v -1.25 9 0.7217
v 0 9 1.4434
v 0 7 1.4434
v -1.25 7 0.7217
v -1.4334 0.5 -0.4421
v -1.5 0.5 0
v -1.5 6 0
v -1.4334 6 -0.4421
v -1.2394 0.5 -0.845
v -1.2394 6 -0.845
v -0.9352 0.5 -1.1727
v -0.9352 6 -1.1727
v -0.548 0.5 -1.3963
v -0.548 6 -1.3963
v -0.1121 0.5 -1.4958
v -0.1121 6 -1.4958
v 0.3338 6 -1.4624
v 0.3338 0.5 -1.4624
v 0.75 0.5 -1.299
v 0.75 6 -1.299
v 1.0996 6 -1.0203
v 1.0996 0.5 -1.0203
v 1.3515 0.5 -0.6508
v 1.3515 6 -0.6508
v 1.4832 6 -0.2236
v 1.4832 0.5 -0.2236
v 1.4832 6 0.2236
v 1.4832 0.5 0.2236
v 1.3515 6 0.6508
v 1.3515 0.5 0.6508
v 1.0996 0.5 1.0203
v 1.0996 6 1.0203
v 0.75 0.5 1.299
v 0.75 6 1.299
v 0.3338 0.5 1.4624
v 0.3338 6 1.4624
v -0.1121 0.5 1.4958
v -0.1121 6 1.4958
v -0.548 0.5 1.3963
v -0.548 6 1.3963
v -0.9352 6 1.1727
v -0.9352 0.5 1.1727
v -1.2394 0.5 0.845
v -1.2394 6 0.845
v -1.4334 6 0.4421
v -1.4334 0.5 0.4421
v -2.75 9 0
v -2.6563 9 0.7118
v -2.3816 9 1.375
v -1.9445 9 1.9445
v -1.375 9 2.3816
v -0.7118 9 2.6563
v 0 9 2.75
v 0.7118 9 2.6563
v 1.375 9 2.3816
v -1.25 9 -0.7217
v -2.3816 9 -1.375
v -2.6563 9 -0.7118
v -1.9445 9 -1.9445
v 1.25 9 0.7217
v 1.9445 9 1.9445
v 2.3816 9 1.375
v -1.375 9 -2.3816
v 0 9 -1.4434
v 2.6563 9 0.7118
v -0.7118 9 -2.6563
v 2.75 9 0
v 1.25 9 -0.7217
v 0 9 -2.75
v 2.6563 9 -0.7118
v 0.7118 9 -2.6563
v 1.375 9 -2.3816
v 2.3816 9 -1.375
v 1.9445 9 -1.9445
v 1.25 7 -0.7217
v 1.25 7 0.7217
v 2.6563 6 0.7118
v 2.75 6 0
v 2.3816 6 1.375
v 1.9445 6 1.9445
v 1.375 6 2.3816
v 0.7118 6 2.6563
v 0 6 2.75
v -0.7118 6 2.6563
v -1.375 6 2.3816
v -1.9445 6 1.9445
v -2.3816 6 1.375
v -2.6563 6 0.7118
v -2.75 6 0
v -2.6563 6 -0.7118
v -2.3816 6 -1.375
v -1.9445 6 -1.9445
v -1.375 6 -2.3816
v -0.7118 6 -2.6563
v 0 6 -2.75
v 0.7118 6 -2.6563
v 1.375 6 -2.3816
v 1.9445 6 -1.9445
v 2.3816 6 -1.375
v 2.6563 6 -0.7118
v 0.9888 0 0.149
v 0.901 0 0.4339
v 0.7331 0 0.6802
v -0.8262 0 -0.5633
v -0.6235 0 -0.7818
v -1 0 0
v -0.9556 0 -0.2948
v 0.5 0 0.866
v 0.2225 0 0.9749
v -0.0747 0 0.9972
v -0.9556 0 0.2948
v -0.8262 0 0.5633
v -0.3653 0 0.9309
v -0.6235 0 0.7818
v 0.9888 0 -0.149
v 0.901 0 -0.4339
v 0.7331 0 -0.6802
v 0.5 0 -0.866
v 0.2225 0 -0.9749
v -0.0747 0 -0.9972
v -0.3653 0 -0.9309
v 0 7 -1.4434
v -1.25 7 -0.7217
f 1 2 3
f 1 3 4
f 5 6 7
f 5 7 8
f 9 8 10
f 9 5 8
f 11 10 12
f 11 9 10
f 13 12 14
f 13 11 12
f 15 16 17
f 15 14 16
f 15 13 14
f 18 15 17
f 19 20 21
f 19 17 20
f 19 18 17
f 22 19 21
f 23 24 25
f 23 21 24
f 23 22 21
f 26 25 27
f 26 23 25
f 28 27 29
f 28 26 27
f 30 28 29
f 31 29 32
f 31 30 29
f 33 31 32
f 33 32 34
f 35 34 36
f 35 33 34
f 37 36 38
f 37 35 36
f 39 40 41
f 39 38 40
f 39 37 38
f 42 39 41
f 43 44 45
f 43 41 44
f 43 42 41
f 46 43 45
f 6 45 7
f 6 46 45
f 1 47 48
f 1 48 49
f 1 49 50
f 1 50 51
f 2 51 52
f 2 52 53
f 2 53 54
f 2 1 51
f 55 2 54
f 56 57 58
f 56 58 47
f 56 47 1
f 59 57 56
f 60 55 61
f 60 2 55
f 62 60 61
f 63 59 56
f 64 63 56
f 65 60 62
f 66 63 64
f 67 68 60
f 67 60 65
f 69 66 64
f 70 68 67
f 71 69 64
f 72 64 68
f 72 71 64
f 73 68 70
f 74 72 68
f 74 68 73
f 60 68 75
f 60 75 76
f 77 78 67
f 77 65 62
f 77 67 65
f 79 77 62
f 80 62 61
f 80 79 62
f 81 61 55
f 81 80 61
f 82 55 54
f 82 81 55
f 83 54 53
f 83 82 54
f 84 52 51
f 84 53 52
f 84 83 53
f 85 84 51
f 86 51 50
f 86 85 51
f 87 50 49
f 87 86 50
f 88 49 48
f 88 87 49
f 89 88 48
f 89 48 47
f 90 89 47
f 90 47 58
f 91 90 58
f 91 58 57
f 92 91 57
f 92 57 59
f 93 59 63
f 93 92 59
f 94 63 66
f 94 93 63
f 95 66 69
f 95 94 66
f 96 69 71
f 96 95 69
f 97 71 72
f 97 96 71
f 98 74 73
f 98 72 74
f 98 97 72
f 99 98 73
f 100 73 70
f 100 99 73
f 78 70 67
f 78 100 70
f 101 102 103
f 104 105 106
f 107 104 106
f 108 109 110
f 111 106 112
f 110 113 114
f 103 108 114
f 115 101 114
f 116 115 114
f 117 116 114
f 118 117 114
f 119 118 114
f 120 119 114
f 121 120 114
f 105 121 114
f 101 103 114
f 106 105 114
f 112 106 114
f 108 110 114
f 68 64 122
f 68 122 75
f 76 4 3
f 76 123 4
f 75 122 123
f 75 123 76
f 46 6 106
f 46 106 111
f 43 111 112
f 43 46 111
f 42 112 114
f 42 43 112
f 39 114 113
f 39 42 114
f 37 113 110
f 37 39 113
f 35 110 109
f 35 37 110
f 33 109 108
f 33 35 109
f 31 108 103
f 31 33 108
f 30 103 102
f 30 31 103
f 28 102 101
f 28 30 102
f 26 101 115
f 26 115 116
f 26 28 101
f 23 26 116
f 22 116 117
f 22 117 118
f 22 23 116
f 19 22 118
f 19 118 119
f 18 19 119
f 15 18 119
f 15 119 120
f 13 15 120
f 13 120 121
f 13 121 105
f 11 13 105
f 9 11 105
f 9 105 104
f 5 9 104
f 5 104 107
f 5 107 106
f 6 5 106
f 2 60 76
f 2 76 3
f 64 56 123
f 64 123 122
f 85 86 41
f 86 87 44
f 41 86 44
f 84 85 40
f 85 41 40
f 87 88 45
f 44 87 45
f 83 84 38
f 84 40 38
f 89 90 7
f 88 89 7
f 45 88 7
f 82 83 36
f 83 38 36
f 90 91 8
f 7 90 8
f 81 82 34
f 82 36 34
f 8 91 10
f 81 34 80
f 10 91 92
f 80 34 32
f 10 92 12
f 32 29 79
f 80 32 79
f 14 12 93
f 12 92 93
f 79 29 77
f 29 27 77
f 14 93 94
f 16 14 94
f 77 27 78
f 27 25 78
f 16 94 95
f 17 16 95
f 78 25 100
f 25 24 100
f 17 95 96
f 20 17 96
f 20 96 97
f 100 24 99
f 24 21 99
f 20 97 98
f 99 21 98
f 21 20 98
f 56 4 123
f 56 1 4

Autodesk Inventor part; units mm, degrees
ref_plane "YZ Plane" through (0, 0, 0) normal (1, 0, 0) x (0, 1, 0)
ref_plane "XZ Plane" through (0, 0, 0) normal (0, 1, 0) x (-1, 0, 0)
ref_plane "XY Plane" through (0, 0, 0) normal (0, 0, 1) x (1, 0, 0)
sketch "Sketch1" plane through (0, 0, 0) normal (0, 1, 0) x (-1, 0, 0)
  circle A0 centre (0, 0) radius 1.5
  dimension "d0" = 3
extrude "Extrusion1" add sketch "Sketch1" along normal blind 6
sketch "Sketch2" plane through (0, 6, 0) normal (0, 1, 0) x (1, 0, 0)
  circle A0 centre (0, 0) radius 1.5 projected
  circle A1 centre (0, 0) radius 2.75
  dimension "d3" = 5.5
extrude "Extrusion2" add sketch "Sketch2" along normal blind 3 contours A0 | A1
sketch "Sketch3" plane through (0, 9, 0) normal (0, 1, 0) x (1, 0, 0)
  circle A0 centre (0, 0) radius 2.75 projected
  line L0 (0, 1.4434) -> (1.25, 0.7217)
  line L1 (1.25, 0.7217) -> (1.25, -0.7217)
  line L2 (1.25, -0.7217) -> (0, -1.4434)
  line L3 (0, -1.4434) -> (-1.25, -0.7217)
  line L4 (-1.25, -0.7217) -> (-1.25, 0.7217)
  line L5 (-1.25, 0.7217) -> (0, 1.4434)
  dimension "d6" = 2.5
extrude "Extrusion3" cut sketch "Sketch3" against normal blind 2 contours L0 L1 L2 L3 L4 L5
thread "Thread1" size "M3x0.5" class "6g" standard "ANSI Metric M Profile" full length
chamfer "Chamfer1" distance 0.5 angle 45 1 edges at (1.5, 0, 0)
properties part number "SHCS3x6" material "Stainless Steel"
